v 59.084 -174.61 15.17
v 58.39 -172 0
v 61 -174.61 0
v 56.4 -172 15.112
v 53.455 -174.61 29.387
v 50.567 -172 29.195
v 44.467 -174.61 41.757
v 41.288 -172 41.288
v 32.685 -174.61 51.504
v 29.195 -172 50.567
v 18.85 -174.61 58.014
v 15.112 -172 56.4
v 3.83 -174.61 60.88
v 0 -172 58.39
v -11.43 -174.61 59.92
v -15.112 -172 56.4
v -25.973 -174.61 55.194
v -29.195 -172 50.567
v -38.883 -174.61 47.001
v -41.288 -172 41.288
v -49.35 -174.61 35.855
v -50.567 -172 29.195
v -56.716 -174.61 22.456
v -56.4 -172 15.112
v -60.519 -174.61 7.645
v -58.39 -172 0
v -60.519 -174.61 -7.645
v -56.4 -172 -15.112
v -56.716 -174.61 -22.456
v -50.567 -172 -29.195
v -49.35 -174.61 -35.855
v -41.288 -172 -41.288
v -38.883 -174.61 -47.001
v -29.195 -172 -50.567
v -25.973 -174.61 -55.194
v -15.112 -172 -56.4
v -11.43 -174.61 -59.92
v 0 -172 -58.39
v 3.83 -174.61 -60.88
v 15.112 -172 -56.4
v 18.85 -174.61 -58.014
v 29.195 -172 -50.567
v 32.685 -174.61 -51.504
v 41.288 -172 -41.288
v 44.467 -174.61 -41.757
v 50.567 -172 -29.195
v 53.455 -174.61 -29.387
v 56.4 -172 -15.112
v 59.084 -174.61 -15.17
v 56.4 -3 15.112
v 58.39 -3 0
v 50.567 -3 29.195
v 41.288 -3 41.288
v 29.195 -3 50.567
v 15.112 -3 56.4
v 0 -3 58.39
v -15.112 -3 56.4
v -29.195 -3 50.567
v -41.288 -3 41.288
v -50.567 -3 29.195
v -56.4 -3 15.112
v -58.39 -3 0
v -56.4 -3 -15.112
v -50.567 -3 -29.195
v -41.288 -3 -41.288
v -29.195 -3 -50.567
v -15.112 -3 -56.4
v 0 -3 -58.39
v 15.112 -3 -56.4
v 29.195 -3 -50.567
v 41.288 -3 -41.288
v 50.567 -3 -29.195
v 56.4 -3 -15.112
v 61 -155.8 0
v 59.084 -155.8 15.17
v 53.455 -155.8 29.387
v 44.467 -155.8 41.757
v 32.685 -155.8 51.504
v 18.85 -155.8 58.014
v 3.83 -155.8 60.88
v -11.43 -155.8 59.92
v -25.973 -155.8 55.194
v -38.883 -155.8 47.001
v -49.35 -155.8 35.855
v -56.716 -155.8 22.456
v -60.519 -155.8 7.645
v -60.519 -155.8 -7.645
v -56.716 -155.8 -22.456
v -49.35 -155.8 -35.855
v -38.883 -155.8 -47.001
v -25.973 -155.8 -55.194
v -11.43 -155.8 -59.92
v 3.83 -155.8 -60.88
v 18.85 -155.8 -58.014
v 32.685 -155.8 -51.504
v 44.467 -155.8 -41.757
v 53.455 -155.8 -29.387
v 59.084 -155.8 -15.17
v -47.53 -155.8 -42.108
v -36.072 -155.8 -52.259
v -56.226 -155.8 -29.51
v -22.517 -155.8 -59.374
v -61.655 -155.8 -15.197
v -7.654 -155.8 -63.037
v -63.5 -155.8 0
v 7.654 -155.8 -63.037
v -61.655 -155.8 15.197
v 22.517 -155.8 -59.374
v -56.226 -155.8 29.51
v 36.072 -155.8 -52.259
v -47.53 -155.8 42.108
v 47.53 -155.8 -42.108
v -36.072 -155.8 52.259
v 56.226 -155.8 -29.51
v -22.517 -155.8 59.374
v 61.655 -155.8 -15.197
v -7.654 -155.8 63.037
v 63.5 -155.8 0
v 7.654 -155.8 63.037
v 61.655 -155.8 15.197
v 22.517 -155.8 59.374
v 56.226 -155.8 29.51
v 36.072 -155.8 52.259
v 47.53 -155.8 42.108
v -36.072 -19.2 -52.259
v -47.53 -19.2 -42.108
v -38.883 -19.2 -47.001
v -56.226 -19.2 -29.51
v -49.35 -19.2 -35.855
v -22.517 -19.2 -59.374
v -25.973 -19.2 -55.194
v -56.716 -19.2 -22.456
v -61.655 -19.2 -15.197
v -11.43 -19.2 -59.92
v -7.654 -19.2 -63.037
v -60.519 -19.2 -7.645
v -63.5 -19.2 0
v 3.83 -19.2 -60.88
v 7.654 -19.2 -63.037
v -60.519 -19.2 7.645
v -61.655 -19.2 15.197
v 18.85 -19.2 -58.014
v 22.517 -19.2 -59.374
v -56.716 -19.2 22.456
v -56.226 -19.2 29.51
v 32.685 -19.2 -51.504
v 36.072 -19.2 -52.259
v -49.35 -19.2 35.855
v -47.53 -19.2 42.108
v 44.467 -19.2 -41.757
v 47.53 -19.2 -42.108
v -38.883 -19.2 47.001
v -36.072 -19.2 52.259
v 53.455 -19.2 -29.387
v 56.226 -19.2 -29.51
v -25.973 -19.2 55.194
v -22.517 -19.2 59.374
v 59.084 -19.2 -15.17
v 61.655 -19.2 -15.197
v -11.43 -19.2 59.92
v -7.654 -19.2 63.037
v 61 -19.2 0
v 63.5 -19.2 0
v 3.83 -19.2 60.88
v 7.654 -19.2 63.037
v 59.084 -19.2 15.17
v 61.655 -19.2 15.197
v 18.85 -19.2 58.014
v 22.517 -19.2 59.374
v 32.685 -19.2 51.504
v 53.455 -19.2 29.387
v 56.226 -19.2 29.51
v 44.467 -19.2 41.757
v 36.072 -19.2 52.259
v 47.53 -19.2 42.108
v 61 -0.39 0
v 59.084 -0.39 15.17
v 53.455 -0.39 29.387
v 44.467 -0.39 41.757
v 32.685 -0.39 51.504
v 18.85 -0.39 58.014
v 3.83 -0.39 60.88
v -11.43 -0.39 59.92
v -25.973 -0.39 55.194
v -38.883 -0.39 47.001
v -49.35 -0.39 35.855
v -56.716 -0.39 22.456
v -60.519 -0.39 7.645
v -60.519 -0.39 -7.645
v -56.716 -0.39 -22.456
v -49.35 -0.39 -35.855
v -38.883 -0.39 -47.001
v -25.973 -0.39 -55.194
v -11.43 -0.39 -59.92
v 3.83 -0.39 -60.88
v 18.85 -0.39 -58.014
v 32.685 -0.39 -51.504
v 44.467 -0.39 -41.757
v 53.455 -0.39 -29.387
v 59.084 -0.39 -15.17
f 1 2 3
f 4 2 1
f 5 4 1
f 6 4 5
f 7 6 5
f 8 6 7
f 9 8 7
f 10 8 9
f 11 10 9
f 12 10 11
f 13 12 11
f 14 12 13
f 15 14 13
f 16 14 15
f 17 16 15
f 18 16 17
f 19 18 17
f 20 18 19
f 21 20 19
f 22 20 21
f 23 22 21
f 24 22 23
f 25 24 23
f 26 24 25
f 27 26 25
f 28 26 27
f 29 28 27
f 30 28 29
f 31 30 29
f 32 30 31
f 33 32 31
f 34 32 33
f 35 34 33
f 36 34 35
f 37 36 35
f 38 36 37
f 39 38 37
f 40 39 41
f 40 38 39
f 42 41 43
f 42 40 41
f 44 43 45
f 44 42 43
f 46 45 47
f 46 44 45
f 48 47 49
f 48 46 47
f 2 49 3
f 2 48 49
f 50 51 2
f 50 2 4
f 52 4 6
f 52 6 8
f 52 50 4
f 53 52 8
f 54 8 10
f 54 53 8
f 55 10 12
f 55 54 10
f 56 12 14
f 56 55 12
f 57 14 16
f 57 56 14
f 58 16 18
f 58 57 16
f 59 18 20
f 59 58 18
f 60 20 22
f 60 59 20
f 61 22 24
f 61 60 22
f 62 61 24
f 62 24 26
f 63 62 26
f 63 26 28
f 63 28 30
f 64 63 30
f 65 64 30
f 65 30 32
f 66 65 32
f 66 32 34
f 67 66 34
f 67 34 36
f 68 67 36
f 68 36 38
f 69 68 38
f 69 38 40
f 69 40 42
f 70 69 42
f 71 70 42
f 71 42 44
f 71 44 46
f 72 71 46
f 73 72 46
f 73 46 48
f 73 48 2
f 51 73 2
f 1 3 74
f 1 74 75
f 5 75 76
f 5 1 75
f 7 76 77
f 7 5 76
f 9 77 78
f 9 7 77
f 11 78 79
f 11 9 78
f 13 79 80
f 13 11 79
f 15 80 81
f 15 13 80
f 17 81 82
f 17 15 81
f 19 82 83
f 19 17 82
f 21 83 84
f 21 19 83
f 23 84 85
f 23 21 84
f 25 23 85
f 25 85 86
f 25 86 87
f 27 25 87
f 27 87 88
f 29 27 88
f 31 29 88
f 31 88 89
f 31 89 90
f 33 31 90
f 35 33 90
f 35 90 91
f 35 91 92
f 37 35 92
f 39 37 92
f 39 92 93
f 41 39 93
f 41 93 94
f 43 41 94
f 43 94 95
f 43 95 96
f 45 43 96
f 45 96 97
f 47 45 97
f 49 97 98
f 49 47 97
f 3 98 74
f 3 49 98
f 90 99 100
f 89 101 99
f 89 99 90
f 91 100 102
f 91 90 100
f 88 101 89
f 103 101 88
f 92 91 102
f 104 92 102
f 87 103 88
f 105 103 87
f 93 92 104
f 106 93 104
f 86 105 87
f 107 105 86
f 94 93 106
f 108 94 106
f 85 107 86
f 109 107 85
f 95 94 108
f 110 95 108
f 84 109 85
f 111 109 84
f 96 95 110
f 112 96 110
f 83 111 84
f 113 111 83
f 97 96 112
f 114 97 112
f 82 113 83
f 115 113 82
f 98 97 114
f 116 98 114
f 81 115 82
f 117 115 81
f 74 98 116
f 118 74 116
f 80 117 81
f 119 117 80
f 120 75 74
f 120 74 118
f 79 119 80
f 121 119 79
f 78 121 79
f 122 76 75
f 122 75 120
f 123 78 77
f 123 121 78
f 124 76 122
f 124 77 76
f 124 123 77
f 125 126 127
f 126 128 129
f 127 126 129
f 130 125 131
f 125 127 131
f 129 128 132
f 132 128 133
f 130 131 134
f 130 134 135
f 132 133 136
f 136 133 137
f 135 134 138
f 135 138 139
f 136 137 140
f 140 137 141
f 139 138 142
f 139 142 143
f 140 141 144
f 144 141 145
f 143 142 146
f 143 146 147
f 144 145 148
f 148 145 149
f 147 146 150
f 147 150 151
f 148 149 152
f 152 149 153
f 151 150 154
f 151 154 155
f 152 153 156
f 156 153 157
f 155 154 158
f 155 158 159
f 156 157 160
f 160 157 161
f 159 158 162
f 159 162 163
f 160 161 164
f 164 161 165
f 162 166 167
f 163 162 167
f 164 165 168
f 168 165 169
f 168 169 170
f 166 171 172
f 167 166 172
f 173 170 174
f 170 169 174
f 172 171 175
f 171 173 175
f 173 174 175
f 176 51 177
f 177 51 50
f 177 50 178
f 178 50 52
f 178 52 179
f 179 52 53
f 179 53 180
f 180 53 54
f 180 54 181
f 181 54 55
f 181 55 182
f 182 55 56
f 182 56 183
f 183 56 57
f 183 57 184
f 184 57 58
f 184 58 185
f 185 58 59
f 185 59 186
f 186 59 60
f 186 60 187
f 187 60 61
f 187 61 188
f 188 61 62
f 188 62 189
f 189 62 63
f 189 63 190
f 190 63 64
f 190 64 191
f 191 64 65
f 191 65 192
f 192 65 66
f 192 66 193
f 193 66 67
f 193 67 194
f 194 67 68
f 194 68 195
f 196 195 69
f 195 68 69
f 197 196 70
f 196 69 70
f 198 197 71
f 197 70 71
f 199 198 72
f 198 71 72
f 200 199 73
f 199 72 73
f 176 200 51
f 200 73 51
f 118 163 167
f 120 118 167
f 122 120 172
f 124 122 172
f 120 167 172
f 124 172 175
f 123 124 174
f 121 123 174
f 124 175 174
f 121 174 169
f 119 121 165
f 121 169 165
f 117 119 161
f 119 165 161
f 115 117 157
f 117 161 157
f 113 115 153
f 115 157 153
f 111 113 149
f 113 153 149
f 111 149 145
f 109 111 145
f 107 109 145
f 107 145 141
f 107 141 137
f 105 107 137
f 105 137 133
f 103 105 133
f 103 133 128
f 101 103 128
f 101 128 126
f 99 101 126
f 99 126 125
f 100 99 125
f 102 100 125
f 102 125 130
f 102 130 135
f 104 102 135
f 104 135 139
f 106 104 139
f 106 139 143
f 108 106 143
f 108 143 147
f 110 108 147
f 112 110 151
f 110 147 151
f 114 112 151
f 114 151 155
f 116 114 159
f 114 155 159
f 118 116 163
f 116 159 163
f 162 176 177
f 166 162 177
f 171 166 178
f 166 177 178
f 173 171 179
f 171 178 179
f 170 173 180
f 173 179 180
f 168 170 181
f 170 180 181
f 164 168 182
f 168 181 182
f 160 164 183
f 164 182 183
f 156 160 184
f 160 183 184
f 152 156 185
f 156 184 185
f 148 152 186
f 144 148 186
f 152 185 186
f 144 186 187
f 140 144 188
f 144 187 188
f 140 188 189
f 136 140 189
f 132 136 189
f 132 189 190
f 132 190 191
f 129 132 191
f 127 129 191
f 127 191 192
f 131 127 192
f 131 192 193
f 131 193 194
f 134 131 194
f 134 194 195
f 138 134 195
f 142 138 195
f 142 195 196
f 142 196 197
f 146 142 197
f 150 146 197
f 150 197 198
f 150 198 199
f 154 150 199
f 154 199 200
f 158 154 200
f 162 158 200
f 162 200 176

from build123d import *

# Parameters (mm, degrees)
F0_R     = 63.5
F0_R_2   = 58.39
F1_DEPTH = 175
F2_R     = 63.5
F2_R_2   = 61
F3_DEPTH = 19.2
F4_R     = 63.5
F4_R_2   = 61
F5_DEPTH = 19.2


# Not quite as in the source:
# - a fillet or chamfer that OpenCascade refuses, or shapes differently, is made with other operations: its cross-section is extruded or revolved along the edge and cut away or added


with BuildPart() as f1:
    # F0 (on Front) → F1 (new body)
    with BuildSketch(Plane.XZ):
        Circle(F0_R)
        Circle(F0_R_2, mode=Mode.SUBTRACT)
    extrude(amount=F1_DEPTH)

    # F2 (on Front) → F3 (cut)
    with BuildSketch(Plane.XZ):
        Circle(F2_R)
        Circle(F2_R_2, mode=Mode.SUBTRACT)
    extrude(amount=F3_DEPTH, mode=Mode.SUBTRACT)

    # F4 (on face) → F5 (cut)
    with BuildSketch(Plane.XZ.offset(175)):
        Circle(F4_R)
        Circle(F4_R_2, mode=Mode.SUBTRACT)
    extrude(amount=-F5_DEPTH, mode=Mode.SUBTRACT)

    # F6: chamfer of 3 on 2 edges, made by hand

    # F6_s1 → F6_t2 (revolve, cut)
    with BuildSketch(Plane.XY):
        Polygon((61.39, -175), (58.39, -172), (58.39, -175), align=None)
    revolve(axis=Axis((0, -175, 0), (0, -1, 0)), mode=Mode.SUBTRACT)

    # F6_s3 → F6_t4 (revolve, cut)
    with BuildSketch(Plane.XY):
        Polygon((61.39, 0), (58.39, -3), (58.39, 0), align=None)
    revolve(axis=Axis((0, 0, 0), (0, -1, 0)), mode=Mode.SUBTRACT)


solid = f1.part
